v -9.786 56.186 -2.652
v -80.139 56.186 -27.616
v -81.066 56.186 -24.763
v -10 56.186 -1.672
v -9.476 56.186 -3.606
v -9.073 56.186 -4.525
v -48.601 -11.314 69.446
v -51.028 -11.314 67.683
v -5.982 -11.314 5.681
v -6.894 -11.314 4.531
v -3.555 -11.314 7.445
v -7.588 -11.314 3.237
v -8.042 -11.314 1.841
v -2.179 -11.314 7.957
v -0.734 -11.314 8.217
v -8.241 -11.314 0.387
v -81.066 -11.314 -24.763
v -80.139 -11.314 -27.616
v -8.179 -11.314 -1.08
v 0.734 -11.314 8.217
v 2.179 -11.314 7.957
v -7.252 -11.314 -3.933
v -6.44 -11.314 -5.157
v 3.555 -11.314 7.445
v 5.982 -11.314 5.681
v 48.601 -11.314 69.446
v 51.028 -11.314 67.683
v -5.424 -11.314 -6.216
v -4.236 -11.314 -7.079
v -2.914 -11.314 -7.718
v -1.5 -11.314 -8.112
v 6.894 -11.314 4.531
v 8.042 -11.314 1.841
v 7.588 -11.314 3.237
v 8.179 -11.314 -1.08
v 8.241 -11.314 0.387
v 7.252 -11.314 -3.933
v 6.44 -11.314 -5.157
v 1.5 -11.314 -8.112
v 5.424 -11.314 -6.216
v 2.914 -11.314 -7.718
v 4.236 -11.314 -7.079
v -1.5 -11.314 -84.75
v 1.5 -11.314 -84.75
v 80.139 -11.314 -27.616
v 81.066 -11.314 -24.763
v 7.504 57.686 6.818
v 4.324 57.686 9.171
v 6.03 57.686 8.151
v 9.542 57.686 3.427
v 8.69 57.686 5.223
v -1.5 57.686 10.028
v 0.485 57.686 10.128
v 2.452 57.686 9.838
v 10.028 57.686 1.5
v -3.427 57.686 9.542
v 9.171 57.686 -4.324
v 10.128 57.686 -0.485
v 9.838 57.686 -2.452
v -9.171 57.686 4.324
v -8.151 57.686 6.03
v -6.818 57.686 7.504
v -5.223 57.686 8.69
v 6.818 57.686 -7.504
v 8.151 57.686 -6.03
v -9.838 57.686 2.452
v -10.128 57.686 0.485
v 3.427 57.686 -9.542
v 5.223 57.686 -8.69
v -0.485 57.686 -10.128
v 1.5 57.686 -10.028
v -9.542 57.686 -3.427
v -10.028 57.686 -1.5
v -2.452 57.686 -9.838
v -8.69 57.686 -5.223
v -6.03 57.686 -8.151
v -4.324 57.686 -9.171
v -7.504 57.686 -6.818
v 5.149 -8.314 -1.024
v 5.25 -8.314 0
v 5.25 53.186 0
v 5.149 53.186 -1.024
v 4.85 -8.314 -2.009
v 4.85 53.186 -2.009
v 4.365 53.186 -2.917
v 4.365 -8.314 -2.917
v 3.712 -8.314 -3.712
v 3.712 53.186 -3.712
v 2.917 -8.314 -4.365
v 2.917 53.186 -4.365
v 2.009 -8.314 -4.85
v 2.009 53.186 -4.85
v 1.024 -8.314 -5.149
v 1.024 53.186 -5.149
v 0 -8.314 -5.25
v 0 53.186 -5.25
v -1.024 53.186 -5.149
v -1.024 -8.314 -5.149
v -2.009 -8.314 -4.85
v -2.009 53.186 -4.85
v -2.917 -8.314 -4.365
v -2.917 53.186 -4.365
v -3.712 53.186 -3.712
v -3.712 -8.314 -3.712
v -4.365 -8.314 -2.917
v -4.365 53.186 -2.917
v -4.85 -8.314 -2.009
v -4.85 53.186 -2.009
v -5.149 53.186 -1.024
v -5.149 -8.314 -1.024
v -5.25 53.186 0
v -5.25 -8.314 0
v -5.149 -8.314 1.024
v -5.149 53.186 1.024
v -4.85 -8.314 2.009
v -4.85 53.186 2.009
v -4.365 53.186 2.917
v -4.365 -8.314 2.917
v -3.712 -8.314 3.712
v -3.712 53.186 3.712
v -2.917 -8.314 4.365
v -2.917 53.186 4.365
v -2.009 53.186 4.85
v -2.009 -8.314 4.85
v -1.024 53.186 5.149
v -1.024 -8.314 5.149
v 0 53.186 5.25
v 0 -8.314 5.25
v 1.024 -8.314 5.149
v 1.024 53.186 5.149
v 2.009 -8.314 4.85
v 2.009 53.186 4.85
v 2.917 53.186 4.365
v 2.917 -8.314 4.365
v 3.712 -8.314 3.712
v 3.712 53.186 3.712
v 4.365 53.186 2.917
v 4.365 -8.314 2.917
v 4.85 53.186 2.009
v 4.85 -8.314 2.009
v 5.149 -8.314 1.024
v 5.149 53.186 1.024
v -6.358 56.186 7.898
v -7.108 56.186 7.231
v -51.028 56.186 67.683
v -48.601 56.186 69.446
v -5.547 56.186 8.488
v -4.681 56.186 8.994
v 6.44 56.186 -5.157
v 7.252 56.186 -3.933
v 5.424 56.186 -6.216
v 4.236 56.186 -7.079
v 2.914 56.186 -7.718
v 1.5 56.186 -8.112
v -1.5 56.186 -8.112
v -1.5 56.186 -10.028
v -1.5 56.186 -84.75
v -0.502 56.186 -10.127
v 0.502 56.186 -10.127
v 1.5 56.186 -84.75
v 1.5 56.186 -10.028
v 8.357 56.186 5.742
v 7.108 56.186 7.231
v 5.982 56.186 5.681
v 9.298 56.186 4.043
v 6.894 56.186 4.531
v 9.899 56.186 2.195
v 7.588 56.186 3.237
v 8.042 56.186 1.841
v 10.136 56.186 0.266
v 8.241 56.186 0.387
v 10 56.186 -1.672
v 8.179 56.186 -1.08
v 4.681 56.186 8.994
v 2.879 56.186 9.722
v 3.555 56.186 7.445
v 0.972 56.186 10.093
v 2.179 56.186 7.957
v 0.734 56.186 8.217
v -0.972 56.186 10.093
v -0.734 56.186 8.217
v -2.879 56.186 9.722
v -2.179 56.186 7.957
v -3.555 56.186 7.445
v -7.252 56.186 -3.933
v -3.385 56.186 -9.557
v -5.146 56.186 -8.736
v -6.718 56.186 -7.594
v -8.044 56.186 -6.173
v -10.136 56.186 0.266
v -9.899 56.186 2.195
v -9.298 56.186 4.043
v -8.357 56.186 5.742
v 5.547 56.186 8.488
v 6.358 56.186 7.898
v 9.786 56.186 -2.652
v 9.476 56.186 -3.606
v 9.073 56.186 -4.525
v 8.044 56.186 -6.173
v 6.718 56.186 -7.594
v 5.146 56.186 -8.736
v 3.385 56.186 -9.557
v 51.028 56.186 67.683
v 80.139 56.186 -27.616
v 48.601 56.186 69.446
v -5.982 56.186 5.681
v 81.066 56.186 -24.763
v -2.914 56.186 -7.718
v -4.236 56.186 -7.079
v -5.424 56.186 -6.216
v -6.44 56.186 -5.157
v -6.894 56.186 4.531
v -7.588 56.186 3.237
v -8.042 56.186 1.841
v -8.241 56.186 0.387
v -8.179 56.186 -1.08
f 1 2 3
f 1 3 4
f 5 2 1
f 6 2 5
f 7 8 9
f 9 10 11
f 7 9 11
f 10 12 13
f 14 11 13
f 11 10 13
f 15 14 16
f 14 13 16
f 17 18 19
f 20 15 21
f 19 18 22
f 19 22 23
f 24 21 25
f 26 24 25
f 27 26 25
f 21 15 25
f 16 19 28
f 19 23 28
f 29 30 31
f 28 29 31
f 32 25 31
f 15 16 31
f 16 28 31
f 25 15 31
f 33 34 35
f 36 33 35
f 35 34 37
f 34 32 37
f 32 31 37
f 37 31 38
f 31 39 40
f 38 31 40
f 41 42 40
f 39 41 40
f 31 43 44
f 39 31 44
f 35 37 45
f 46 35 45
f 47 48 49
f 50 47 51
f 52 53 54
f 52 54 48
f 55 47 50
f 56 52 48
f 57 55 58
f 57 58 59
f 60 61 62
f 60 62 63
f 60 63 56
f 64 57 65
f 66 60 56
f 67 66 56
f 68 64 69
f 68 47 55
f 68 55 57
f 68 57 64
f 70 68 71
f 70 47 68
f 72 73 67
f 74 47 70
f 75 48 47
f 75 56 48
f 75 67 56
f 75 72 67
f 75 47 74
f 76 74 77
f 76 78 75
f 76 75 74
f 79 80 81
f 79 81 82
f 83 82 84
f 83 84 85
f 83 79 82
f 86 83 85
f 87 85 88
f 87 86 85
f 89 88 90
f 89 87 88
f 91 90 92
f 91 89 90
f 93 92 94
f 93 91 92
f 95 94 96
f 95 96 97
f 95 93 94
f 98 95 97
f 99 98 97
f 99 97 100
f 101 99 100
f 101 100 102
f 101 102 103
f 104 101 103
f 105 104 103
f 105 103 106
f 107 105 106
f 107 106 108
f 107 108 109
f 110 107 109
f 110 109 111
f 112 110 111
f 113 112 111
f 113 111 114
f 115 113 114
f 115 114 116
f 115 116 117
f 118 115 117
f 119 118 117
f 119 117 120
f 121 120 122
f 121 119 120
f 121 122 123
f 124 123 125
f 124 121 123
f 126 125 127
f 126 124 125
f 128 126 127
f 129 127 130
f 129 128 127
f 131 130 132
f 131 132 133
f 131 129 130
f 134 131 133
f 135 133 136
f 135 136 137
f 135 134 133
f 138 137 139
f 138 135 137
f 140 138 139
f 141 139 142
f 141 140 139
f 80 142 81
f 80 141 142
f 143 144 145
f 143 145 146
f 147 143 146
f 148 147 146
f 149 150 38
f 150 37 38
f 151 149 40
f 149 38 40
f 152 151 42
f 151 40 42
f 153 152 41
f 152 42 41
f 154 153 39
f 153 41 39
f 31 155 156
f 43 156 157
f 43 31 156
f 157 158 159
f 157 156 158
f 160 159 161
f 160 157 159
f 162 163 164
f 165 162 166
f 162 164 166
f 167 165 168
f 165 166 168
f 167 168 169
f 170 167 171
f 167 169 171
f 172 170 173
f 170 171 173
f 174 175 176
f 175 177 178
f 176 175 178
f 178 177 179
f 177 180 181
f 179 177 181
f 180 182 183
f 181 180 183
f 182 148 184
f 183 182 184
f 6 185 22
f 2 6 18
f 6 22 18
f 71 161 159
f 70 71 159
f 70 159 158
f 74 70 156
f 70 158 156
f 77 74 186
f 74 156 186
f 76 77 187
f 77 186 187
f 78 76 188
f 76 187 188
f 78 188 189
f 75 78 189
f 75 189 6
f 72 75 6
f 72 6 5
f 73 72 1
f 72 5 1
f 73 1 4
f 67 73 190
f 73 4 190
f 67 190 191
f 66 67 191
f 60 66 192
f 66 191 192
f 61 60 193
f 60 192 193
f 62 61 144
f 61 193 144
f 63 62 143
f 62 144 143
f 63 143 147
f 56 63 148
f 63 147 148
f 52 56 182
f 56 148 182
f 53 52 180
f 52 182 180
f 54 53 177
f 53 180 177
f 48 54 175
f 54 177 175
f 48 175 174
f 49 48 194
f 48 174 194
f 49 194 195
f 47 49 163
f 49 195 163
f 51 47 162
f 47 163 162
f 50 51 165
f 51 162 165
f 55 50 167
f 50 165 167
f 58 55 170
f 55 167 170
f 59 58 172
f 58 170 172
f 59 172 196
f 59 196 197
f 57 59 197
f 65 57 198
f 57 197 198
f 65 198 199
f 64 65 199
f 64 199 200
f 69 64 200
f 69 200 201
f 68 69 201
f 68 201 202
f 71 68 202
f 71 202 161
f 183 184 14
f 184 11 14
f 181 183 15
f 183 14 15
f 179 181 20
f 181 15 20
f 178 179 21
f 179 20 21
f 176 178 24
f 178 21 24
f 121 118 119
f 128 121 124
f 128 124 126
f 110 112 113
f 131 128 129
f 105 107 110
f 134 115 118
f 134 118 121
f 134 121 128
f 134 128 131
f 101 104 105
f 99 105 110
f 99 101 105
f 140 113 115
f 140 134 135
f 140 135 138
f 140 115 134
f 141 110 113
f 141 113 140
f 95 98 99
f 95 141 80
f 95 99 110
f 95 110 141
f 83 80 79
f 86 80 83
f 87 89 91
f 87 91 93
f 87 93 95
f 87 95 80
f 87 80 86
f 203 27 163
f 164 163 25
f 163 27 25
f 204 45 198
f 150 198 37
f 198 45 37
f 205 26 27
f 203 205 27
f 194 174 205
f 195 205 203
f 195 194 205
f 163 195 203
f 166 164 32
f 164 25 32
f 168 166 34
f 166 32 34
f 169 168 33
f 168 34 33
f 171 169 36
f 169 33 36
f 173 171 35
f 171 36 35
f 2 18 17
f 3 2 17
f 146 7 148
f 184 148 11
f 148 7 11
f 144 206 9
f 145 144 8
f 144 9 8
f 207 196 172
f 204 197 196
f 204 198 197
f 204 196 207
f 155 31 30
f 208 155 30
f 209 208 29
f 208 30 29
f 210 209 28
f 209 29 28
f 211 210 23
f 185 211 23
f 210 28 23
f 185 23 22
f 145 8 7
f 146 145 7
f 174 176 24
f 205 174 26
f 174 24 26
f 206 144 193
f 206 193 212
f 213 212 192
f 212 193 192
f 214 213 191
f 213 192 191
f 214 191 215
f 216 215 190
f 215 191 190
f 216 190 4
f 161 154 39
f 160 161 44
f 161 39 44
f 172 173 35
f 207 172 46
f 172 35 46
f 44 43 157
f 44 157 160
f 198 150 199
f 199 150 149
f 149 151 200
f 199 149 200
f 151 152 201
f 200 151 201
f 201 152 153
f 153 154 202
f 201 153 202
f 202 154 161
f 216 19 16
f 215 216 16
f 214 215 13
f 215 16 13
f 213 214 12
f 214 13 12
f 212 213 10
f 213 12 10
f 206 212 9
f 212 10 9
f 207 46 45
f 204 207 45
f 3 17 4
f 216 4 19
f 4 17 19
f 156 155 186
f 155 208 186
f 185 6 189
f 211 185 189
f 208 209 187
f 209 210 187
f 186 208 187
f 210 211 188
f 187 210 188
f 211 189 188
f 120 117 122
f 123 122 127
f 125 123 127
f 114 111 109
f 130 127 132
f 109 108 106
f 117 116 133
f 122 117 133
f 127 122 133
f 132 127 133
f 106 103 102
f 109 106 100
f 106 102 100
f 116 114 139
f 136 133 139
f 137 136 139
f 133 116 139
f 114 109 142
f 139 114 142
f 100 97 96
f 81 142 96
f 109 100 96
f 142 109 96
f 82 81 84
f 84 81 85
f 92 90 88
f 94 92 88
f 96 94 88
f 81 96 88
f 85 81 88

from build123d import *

# Parameters (mm, degrees)
EXTRUDE_THIN2_OUTLINE_R   = 5.5
EXTRUDE_THIN2_OUTLINE_R_2 = 3.5
EXTRUDE_THIN2_DEPTH       = 45
EXTRUDE_THIN2_2_OUTLINE_R = 3.5
EXTRUDE_THIN2_2_DEPTH     = 2
EXTRUDE_THIN2_START       = 43
EXTRUDE_THIN2_3_OUTLINE_R = 3.5
EXTRUDE_THIN2_3_DEPTH     = 2
EXTRUDE_THIN2_4_DEPTH     = 45
EXTRUDE_THIN2_5_DEPTH     = 45
EXTRUDE_THIN2_6_DEPTH     = 45
EXTRUDE_THIN2_7_DEPTH     = 45
EXTRUDE_THIN2_8_OUTLINE_W = 2
EXTRUDE_THIN2_8_OUTLINE_H = 52
EXTRUDE_THIN2_8_DEPTH     = 45
SKETCH4_R                 = 5.5
BOSS_EXTRUDE2_DEPTH       = 0.001
SKETCH6_R                 = 6.759527971
BOSS_EXTRUDE3_DEPTH       = 1
SCALE1_SCALE              = 1.5


# Read off the part's stored shape, not the designer's step: Extrude-Thin2
with BuildPart() as part:
    # Extrude-Thin2 outline → Extrude-Thin2 (new body)
    with BuildSketch(Plane(origin=(0, 0, 0), x_dir=(1, 0, 0), z_dir=(0, 1, 0))):
        Circle(EXTRUDE_THIN2_OUTLINE_R)
        Circle(EXTRUDE_THIN2_OUTLINE_R_2, mode=Mode.SUBTRACT)
    extrude(amount=EXTRUDE_THIN2_DEPTH)

    # Extrude-Thin2 2 outline → Extrude-Thin2 2 (add)
    with BuildSketch(Plane(origin=(0, 0, 0), x_dir=(1, 0, 0), z_dir=(0, 1, 0))):
        Circle(EXTRUDE_THIN2_2_OUTLINE_R)
    extrude(amount=EXTRUDE_THIN2_2_DEPTH)

    # Extrude-Thin2 3 outline → Extrude-Thin2 3 (add)
    with BuildSketch(Plane(origin=(0, 0, 0), x_dir=(1, 0, 0), z_dir=(0, 1, 0)).offset(EXTRUDE_THIN2_START)):
        Circle(EXTRUDE_THIN2_3_OUTLINE_R)
    extrude(amount=EXTRUDE_THIN2_3_DEPTH)



with BuildPart() as body_2:
    # Extrude-Thin2 4 outline → Extrude-Thin2 4 (new body)
    with BuildSketch(Plane(origin=(0, 0, 0), x_dir=(1, 0, 0), z_dir=(0, 1, 0))):
        Polygon((-3.970737329, 2.341632991), (-53.425676176, 18.410516698), (-54.043710165, 16.508403666), (-4.588771318, 0.439519958), align=None)
    extrude(amount=EXTRUDE_THIN2_4_DEPTH)


with BuildPart() as body_3:
    # Extrude-Thin2 5 outline → Extrude-Thin2 5 (new body)
    with BuildSketch(Plane(origin=(0, 0, 0), x_dir=(1, 0, 0), z_dir=(0, 1, 0))):
        Polygon((-3.45405063, -3.052791222), (-34.018883749, -45.12167493), (-32.40084976, -46.297245434), (-1.836016641, -4.228361727), align=None)
    extrude(amount=EXTRUDE_THIN2_5_DEPTH)


with BuildPart() as body_4:
    # Extrude-Thin2 6 outline → Extrude-Thin2 6 (new body)
    with BuildSketch(Plane(origin=(0, 0, 0), x_dir=(1, 0, 0), z_dir=(0, 1, 0))):
        Polygon((1.836016641, -4.228361727), (32.40084976, -46.297245434), (34.018883749, -45.12167493), (3.45405063, -3.052791222), align=None)
    extrude(amount=EXTRUDE_THIN2_6_DEPTH)


with BuildPart() as body_5:
    # Extrude-Thin2 7 outline → Extrude-Thin2 7 (new body)
    with BuildSketch(Plane(origin=(0, 0, 0), x_dir=(1, 0, 0), z_dir=(0, 1, 0))):
        Polygon((4.588771318, 0.439519958), (54.043710165, 16.508403666), (53.425676176, 18.410516698), (3.970737329, 2.341632991), align=None)
    extrude(amount=EXTRUDE_THIN2_7_DEPTH)


with BuildPart() as body_6:
    # Extrude-Thin2 8 outline → Extrude-Thin2 8 (new body)
    with BuildSketch(Plane(origin=(0, 0, 0), x_dir=(1, 0, 0), z_dir=(0, 1, 0))):
        with Locations((0, 30.5)):
            Rectangle(EXTRUDE_THIN2_8_OUTLINE_W, EXTRUDE_THIN2_8_OUTLINE_H)
    extrude(amount=EXTRUDE_THIN2_8_DEPTH)


with BuildPart() as part_1:
    add(part.part)

    add(body_2.part)  # Boss-Extrude2 merges body 2

    add(body_3.part)  # Boss-Extrude2 merges body 3

    add(body_4.part)  # Boss-Extrude2 merges body 4

    add(body_5.part)  # Boss-Extrude2 merges body 5

    add(body_6.part)  # Boss-Extrude2 merges body 6
    # Sketch4 → Boss-Extrude2 (add)
    with BuildSketch(Plane(origin=(0, 45, 0), x_dir=(1, 0, 0), z_dir=(0, 1, 0))):
        with Locations(Location((0, 0, 0), (0, 0, 79.524318304))):
            Circle(SKETCH4_R)
    extrude(amount=BOSS_EXTRUDE2_DEPTH)

    # Sketch6 → Boss-Extrude3 (add)
    with BuildSketch(Plane(origin=(0, 45, 0), x_dir=(1, 0, 0), z_dir=(0, 1, 0))):
        with Locations(Location((0, 0, 0), (0, 0, 81.492473787))):
            Circle(SKETCH6_R)
    extrude(amount=BOSS_EXTRUDE3_DEPTH)


with BuildPart() as part_2:
    # Scale1: scaled about (0, 22.627935727, 1e-09)
    add(part_1.part.scale(SCALE1_SCALE).moved(Location((0, -11.313967864, -1e-09))))


solid = part_2.part
